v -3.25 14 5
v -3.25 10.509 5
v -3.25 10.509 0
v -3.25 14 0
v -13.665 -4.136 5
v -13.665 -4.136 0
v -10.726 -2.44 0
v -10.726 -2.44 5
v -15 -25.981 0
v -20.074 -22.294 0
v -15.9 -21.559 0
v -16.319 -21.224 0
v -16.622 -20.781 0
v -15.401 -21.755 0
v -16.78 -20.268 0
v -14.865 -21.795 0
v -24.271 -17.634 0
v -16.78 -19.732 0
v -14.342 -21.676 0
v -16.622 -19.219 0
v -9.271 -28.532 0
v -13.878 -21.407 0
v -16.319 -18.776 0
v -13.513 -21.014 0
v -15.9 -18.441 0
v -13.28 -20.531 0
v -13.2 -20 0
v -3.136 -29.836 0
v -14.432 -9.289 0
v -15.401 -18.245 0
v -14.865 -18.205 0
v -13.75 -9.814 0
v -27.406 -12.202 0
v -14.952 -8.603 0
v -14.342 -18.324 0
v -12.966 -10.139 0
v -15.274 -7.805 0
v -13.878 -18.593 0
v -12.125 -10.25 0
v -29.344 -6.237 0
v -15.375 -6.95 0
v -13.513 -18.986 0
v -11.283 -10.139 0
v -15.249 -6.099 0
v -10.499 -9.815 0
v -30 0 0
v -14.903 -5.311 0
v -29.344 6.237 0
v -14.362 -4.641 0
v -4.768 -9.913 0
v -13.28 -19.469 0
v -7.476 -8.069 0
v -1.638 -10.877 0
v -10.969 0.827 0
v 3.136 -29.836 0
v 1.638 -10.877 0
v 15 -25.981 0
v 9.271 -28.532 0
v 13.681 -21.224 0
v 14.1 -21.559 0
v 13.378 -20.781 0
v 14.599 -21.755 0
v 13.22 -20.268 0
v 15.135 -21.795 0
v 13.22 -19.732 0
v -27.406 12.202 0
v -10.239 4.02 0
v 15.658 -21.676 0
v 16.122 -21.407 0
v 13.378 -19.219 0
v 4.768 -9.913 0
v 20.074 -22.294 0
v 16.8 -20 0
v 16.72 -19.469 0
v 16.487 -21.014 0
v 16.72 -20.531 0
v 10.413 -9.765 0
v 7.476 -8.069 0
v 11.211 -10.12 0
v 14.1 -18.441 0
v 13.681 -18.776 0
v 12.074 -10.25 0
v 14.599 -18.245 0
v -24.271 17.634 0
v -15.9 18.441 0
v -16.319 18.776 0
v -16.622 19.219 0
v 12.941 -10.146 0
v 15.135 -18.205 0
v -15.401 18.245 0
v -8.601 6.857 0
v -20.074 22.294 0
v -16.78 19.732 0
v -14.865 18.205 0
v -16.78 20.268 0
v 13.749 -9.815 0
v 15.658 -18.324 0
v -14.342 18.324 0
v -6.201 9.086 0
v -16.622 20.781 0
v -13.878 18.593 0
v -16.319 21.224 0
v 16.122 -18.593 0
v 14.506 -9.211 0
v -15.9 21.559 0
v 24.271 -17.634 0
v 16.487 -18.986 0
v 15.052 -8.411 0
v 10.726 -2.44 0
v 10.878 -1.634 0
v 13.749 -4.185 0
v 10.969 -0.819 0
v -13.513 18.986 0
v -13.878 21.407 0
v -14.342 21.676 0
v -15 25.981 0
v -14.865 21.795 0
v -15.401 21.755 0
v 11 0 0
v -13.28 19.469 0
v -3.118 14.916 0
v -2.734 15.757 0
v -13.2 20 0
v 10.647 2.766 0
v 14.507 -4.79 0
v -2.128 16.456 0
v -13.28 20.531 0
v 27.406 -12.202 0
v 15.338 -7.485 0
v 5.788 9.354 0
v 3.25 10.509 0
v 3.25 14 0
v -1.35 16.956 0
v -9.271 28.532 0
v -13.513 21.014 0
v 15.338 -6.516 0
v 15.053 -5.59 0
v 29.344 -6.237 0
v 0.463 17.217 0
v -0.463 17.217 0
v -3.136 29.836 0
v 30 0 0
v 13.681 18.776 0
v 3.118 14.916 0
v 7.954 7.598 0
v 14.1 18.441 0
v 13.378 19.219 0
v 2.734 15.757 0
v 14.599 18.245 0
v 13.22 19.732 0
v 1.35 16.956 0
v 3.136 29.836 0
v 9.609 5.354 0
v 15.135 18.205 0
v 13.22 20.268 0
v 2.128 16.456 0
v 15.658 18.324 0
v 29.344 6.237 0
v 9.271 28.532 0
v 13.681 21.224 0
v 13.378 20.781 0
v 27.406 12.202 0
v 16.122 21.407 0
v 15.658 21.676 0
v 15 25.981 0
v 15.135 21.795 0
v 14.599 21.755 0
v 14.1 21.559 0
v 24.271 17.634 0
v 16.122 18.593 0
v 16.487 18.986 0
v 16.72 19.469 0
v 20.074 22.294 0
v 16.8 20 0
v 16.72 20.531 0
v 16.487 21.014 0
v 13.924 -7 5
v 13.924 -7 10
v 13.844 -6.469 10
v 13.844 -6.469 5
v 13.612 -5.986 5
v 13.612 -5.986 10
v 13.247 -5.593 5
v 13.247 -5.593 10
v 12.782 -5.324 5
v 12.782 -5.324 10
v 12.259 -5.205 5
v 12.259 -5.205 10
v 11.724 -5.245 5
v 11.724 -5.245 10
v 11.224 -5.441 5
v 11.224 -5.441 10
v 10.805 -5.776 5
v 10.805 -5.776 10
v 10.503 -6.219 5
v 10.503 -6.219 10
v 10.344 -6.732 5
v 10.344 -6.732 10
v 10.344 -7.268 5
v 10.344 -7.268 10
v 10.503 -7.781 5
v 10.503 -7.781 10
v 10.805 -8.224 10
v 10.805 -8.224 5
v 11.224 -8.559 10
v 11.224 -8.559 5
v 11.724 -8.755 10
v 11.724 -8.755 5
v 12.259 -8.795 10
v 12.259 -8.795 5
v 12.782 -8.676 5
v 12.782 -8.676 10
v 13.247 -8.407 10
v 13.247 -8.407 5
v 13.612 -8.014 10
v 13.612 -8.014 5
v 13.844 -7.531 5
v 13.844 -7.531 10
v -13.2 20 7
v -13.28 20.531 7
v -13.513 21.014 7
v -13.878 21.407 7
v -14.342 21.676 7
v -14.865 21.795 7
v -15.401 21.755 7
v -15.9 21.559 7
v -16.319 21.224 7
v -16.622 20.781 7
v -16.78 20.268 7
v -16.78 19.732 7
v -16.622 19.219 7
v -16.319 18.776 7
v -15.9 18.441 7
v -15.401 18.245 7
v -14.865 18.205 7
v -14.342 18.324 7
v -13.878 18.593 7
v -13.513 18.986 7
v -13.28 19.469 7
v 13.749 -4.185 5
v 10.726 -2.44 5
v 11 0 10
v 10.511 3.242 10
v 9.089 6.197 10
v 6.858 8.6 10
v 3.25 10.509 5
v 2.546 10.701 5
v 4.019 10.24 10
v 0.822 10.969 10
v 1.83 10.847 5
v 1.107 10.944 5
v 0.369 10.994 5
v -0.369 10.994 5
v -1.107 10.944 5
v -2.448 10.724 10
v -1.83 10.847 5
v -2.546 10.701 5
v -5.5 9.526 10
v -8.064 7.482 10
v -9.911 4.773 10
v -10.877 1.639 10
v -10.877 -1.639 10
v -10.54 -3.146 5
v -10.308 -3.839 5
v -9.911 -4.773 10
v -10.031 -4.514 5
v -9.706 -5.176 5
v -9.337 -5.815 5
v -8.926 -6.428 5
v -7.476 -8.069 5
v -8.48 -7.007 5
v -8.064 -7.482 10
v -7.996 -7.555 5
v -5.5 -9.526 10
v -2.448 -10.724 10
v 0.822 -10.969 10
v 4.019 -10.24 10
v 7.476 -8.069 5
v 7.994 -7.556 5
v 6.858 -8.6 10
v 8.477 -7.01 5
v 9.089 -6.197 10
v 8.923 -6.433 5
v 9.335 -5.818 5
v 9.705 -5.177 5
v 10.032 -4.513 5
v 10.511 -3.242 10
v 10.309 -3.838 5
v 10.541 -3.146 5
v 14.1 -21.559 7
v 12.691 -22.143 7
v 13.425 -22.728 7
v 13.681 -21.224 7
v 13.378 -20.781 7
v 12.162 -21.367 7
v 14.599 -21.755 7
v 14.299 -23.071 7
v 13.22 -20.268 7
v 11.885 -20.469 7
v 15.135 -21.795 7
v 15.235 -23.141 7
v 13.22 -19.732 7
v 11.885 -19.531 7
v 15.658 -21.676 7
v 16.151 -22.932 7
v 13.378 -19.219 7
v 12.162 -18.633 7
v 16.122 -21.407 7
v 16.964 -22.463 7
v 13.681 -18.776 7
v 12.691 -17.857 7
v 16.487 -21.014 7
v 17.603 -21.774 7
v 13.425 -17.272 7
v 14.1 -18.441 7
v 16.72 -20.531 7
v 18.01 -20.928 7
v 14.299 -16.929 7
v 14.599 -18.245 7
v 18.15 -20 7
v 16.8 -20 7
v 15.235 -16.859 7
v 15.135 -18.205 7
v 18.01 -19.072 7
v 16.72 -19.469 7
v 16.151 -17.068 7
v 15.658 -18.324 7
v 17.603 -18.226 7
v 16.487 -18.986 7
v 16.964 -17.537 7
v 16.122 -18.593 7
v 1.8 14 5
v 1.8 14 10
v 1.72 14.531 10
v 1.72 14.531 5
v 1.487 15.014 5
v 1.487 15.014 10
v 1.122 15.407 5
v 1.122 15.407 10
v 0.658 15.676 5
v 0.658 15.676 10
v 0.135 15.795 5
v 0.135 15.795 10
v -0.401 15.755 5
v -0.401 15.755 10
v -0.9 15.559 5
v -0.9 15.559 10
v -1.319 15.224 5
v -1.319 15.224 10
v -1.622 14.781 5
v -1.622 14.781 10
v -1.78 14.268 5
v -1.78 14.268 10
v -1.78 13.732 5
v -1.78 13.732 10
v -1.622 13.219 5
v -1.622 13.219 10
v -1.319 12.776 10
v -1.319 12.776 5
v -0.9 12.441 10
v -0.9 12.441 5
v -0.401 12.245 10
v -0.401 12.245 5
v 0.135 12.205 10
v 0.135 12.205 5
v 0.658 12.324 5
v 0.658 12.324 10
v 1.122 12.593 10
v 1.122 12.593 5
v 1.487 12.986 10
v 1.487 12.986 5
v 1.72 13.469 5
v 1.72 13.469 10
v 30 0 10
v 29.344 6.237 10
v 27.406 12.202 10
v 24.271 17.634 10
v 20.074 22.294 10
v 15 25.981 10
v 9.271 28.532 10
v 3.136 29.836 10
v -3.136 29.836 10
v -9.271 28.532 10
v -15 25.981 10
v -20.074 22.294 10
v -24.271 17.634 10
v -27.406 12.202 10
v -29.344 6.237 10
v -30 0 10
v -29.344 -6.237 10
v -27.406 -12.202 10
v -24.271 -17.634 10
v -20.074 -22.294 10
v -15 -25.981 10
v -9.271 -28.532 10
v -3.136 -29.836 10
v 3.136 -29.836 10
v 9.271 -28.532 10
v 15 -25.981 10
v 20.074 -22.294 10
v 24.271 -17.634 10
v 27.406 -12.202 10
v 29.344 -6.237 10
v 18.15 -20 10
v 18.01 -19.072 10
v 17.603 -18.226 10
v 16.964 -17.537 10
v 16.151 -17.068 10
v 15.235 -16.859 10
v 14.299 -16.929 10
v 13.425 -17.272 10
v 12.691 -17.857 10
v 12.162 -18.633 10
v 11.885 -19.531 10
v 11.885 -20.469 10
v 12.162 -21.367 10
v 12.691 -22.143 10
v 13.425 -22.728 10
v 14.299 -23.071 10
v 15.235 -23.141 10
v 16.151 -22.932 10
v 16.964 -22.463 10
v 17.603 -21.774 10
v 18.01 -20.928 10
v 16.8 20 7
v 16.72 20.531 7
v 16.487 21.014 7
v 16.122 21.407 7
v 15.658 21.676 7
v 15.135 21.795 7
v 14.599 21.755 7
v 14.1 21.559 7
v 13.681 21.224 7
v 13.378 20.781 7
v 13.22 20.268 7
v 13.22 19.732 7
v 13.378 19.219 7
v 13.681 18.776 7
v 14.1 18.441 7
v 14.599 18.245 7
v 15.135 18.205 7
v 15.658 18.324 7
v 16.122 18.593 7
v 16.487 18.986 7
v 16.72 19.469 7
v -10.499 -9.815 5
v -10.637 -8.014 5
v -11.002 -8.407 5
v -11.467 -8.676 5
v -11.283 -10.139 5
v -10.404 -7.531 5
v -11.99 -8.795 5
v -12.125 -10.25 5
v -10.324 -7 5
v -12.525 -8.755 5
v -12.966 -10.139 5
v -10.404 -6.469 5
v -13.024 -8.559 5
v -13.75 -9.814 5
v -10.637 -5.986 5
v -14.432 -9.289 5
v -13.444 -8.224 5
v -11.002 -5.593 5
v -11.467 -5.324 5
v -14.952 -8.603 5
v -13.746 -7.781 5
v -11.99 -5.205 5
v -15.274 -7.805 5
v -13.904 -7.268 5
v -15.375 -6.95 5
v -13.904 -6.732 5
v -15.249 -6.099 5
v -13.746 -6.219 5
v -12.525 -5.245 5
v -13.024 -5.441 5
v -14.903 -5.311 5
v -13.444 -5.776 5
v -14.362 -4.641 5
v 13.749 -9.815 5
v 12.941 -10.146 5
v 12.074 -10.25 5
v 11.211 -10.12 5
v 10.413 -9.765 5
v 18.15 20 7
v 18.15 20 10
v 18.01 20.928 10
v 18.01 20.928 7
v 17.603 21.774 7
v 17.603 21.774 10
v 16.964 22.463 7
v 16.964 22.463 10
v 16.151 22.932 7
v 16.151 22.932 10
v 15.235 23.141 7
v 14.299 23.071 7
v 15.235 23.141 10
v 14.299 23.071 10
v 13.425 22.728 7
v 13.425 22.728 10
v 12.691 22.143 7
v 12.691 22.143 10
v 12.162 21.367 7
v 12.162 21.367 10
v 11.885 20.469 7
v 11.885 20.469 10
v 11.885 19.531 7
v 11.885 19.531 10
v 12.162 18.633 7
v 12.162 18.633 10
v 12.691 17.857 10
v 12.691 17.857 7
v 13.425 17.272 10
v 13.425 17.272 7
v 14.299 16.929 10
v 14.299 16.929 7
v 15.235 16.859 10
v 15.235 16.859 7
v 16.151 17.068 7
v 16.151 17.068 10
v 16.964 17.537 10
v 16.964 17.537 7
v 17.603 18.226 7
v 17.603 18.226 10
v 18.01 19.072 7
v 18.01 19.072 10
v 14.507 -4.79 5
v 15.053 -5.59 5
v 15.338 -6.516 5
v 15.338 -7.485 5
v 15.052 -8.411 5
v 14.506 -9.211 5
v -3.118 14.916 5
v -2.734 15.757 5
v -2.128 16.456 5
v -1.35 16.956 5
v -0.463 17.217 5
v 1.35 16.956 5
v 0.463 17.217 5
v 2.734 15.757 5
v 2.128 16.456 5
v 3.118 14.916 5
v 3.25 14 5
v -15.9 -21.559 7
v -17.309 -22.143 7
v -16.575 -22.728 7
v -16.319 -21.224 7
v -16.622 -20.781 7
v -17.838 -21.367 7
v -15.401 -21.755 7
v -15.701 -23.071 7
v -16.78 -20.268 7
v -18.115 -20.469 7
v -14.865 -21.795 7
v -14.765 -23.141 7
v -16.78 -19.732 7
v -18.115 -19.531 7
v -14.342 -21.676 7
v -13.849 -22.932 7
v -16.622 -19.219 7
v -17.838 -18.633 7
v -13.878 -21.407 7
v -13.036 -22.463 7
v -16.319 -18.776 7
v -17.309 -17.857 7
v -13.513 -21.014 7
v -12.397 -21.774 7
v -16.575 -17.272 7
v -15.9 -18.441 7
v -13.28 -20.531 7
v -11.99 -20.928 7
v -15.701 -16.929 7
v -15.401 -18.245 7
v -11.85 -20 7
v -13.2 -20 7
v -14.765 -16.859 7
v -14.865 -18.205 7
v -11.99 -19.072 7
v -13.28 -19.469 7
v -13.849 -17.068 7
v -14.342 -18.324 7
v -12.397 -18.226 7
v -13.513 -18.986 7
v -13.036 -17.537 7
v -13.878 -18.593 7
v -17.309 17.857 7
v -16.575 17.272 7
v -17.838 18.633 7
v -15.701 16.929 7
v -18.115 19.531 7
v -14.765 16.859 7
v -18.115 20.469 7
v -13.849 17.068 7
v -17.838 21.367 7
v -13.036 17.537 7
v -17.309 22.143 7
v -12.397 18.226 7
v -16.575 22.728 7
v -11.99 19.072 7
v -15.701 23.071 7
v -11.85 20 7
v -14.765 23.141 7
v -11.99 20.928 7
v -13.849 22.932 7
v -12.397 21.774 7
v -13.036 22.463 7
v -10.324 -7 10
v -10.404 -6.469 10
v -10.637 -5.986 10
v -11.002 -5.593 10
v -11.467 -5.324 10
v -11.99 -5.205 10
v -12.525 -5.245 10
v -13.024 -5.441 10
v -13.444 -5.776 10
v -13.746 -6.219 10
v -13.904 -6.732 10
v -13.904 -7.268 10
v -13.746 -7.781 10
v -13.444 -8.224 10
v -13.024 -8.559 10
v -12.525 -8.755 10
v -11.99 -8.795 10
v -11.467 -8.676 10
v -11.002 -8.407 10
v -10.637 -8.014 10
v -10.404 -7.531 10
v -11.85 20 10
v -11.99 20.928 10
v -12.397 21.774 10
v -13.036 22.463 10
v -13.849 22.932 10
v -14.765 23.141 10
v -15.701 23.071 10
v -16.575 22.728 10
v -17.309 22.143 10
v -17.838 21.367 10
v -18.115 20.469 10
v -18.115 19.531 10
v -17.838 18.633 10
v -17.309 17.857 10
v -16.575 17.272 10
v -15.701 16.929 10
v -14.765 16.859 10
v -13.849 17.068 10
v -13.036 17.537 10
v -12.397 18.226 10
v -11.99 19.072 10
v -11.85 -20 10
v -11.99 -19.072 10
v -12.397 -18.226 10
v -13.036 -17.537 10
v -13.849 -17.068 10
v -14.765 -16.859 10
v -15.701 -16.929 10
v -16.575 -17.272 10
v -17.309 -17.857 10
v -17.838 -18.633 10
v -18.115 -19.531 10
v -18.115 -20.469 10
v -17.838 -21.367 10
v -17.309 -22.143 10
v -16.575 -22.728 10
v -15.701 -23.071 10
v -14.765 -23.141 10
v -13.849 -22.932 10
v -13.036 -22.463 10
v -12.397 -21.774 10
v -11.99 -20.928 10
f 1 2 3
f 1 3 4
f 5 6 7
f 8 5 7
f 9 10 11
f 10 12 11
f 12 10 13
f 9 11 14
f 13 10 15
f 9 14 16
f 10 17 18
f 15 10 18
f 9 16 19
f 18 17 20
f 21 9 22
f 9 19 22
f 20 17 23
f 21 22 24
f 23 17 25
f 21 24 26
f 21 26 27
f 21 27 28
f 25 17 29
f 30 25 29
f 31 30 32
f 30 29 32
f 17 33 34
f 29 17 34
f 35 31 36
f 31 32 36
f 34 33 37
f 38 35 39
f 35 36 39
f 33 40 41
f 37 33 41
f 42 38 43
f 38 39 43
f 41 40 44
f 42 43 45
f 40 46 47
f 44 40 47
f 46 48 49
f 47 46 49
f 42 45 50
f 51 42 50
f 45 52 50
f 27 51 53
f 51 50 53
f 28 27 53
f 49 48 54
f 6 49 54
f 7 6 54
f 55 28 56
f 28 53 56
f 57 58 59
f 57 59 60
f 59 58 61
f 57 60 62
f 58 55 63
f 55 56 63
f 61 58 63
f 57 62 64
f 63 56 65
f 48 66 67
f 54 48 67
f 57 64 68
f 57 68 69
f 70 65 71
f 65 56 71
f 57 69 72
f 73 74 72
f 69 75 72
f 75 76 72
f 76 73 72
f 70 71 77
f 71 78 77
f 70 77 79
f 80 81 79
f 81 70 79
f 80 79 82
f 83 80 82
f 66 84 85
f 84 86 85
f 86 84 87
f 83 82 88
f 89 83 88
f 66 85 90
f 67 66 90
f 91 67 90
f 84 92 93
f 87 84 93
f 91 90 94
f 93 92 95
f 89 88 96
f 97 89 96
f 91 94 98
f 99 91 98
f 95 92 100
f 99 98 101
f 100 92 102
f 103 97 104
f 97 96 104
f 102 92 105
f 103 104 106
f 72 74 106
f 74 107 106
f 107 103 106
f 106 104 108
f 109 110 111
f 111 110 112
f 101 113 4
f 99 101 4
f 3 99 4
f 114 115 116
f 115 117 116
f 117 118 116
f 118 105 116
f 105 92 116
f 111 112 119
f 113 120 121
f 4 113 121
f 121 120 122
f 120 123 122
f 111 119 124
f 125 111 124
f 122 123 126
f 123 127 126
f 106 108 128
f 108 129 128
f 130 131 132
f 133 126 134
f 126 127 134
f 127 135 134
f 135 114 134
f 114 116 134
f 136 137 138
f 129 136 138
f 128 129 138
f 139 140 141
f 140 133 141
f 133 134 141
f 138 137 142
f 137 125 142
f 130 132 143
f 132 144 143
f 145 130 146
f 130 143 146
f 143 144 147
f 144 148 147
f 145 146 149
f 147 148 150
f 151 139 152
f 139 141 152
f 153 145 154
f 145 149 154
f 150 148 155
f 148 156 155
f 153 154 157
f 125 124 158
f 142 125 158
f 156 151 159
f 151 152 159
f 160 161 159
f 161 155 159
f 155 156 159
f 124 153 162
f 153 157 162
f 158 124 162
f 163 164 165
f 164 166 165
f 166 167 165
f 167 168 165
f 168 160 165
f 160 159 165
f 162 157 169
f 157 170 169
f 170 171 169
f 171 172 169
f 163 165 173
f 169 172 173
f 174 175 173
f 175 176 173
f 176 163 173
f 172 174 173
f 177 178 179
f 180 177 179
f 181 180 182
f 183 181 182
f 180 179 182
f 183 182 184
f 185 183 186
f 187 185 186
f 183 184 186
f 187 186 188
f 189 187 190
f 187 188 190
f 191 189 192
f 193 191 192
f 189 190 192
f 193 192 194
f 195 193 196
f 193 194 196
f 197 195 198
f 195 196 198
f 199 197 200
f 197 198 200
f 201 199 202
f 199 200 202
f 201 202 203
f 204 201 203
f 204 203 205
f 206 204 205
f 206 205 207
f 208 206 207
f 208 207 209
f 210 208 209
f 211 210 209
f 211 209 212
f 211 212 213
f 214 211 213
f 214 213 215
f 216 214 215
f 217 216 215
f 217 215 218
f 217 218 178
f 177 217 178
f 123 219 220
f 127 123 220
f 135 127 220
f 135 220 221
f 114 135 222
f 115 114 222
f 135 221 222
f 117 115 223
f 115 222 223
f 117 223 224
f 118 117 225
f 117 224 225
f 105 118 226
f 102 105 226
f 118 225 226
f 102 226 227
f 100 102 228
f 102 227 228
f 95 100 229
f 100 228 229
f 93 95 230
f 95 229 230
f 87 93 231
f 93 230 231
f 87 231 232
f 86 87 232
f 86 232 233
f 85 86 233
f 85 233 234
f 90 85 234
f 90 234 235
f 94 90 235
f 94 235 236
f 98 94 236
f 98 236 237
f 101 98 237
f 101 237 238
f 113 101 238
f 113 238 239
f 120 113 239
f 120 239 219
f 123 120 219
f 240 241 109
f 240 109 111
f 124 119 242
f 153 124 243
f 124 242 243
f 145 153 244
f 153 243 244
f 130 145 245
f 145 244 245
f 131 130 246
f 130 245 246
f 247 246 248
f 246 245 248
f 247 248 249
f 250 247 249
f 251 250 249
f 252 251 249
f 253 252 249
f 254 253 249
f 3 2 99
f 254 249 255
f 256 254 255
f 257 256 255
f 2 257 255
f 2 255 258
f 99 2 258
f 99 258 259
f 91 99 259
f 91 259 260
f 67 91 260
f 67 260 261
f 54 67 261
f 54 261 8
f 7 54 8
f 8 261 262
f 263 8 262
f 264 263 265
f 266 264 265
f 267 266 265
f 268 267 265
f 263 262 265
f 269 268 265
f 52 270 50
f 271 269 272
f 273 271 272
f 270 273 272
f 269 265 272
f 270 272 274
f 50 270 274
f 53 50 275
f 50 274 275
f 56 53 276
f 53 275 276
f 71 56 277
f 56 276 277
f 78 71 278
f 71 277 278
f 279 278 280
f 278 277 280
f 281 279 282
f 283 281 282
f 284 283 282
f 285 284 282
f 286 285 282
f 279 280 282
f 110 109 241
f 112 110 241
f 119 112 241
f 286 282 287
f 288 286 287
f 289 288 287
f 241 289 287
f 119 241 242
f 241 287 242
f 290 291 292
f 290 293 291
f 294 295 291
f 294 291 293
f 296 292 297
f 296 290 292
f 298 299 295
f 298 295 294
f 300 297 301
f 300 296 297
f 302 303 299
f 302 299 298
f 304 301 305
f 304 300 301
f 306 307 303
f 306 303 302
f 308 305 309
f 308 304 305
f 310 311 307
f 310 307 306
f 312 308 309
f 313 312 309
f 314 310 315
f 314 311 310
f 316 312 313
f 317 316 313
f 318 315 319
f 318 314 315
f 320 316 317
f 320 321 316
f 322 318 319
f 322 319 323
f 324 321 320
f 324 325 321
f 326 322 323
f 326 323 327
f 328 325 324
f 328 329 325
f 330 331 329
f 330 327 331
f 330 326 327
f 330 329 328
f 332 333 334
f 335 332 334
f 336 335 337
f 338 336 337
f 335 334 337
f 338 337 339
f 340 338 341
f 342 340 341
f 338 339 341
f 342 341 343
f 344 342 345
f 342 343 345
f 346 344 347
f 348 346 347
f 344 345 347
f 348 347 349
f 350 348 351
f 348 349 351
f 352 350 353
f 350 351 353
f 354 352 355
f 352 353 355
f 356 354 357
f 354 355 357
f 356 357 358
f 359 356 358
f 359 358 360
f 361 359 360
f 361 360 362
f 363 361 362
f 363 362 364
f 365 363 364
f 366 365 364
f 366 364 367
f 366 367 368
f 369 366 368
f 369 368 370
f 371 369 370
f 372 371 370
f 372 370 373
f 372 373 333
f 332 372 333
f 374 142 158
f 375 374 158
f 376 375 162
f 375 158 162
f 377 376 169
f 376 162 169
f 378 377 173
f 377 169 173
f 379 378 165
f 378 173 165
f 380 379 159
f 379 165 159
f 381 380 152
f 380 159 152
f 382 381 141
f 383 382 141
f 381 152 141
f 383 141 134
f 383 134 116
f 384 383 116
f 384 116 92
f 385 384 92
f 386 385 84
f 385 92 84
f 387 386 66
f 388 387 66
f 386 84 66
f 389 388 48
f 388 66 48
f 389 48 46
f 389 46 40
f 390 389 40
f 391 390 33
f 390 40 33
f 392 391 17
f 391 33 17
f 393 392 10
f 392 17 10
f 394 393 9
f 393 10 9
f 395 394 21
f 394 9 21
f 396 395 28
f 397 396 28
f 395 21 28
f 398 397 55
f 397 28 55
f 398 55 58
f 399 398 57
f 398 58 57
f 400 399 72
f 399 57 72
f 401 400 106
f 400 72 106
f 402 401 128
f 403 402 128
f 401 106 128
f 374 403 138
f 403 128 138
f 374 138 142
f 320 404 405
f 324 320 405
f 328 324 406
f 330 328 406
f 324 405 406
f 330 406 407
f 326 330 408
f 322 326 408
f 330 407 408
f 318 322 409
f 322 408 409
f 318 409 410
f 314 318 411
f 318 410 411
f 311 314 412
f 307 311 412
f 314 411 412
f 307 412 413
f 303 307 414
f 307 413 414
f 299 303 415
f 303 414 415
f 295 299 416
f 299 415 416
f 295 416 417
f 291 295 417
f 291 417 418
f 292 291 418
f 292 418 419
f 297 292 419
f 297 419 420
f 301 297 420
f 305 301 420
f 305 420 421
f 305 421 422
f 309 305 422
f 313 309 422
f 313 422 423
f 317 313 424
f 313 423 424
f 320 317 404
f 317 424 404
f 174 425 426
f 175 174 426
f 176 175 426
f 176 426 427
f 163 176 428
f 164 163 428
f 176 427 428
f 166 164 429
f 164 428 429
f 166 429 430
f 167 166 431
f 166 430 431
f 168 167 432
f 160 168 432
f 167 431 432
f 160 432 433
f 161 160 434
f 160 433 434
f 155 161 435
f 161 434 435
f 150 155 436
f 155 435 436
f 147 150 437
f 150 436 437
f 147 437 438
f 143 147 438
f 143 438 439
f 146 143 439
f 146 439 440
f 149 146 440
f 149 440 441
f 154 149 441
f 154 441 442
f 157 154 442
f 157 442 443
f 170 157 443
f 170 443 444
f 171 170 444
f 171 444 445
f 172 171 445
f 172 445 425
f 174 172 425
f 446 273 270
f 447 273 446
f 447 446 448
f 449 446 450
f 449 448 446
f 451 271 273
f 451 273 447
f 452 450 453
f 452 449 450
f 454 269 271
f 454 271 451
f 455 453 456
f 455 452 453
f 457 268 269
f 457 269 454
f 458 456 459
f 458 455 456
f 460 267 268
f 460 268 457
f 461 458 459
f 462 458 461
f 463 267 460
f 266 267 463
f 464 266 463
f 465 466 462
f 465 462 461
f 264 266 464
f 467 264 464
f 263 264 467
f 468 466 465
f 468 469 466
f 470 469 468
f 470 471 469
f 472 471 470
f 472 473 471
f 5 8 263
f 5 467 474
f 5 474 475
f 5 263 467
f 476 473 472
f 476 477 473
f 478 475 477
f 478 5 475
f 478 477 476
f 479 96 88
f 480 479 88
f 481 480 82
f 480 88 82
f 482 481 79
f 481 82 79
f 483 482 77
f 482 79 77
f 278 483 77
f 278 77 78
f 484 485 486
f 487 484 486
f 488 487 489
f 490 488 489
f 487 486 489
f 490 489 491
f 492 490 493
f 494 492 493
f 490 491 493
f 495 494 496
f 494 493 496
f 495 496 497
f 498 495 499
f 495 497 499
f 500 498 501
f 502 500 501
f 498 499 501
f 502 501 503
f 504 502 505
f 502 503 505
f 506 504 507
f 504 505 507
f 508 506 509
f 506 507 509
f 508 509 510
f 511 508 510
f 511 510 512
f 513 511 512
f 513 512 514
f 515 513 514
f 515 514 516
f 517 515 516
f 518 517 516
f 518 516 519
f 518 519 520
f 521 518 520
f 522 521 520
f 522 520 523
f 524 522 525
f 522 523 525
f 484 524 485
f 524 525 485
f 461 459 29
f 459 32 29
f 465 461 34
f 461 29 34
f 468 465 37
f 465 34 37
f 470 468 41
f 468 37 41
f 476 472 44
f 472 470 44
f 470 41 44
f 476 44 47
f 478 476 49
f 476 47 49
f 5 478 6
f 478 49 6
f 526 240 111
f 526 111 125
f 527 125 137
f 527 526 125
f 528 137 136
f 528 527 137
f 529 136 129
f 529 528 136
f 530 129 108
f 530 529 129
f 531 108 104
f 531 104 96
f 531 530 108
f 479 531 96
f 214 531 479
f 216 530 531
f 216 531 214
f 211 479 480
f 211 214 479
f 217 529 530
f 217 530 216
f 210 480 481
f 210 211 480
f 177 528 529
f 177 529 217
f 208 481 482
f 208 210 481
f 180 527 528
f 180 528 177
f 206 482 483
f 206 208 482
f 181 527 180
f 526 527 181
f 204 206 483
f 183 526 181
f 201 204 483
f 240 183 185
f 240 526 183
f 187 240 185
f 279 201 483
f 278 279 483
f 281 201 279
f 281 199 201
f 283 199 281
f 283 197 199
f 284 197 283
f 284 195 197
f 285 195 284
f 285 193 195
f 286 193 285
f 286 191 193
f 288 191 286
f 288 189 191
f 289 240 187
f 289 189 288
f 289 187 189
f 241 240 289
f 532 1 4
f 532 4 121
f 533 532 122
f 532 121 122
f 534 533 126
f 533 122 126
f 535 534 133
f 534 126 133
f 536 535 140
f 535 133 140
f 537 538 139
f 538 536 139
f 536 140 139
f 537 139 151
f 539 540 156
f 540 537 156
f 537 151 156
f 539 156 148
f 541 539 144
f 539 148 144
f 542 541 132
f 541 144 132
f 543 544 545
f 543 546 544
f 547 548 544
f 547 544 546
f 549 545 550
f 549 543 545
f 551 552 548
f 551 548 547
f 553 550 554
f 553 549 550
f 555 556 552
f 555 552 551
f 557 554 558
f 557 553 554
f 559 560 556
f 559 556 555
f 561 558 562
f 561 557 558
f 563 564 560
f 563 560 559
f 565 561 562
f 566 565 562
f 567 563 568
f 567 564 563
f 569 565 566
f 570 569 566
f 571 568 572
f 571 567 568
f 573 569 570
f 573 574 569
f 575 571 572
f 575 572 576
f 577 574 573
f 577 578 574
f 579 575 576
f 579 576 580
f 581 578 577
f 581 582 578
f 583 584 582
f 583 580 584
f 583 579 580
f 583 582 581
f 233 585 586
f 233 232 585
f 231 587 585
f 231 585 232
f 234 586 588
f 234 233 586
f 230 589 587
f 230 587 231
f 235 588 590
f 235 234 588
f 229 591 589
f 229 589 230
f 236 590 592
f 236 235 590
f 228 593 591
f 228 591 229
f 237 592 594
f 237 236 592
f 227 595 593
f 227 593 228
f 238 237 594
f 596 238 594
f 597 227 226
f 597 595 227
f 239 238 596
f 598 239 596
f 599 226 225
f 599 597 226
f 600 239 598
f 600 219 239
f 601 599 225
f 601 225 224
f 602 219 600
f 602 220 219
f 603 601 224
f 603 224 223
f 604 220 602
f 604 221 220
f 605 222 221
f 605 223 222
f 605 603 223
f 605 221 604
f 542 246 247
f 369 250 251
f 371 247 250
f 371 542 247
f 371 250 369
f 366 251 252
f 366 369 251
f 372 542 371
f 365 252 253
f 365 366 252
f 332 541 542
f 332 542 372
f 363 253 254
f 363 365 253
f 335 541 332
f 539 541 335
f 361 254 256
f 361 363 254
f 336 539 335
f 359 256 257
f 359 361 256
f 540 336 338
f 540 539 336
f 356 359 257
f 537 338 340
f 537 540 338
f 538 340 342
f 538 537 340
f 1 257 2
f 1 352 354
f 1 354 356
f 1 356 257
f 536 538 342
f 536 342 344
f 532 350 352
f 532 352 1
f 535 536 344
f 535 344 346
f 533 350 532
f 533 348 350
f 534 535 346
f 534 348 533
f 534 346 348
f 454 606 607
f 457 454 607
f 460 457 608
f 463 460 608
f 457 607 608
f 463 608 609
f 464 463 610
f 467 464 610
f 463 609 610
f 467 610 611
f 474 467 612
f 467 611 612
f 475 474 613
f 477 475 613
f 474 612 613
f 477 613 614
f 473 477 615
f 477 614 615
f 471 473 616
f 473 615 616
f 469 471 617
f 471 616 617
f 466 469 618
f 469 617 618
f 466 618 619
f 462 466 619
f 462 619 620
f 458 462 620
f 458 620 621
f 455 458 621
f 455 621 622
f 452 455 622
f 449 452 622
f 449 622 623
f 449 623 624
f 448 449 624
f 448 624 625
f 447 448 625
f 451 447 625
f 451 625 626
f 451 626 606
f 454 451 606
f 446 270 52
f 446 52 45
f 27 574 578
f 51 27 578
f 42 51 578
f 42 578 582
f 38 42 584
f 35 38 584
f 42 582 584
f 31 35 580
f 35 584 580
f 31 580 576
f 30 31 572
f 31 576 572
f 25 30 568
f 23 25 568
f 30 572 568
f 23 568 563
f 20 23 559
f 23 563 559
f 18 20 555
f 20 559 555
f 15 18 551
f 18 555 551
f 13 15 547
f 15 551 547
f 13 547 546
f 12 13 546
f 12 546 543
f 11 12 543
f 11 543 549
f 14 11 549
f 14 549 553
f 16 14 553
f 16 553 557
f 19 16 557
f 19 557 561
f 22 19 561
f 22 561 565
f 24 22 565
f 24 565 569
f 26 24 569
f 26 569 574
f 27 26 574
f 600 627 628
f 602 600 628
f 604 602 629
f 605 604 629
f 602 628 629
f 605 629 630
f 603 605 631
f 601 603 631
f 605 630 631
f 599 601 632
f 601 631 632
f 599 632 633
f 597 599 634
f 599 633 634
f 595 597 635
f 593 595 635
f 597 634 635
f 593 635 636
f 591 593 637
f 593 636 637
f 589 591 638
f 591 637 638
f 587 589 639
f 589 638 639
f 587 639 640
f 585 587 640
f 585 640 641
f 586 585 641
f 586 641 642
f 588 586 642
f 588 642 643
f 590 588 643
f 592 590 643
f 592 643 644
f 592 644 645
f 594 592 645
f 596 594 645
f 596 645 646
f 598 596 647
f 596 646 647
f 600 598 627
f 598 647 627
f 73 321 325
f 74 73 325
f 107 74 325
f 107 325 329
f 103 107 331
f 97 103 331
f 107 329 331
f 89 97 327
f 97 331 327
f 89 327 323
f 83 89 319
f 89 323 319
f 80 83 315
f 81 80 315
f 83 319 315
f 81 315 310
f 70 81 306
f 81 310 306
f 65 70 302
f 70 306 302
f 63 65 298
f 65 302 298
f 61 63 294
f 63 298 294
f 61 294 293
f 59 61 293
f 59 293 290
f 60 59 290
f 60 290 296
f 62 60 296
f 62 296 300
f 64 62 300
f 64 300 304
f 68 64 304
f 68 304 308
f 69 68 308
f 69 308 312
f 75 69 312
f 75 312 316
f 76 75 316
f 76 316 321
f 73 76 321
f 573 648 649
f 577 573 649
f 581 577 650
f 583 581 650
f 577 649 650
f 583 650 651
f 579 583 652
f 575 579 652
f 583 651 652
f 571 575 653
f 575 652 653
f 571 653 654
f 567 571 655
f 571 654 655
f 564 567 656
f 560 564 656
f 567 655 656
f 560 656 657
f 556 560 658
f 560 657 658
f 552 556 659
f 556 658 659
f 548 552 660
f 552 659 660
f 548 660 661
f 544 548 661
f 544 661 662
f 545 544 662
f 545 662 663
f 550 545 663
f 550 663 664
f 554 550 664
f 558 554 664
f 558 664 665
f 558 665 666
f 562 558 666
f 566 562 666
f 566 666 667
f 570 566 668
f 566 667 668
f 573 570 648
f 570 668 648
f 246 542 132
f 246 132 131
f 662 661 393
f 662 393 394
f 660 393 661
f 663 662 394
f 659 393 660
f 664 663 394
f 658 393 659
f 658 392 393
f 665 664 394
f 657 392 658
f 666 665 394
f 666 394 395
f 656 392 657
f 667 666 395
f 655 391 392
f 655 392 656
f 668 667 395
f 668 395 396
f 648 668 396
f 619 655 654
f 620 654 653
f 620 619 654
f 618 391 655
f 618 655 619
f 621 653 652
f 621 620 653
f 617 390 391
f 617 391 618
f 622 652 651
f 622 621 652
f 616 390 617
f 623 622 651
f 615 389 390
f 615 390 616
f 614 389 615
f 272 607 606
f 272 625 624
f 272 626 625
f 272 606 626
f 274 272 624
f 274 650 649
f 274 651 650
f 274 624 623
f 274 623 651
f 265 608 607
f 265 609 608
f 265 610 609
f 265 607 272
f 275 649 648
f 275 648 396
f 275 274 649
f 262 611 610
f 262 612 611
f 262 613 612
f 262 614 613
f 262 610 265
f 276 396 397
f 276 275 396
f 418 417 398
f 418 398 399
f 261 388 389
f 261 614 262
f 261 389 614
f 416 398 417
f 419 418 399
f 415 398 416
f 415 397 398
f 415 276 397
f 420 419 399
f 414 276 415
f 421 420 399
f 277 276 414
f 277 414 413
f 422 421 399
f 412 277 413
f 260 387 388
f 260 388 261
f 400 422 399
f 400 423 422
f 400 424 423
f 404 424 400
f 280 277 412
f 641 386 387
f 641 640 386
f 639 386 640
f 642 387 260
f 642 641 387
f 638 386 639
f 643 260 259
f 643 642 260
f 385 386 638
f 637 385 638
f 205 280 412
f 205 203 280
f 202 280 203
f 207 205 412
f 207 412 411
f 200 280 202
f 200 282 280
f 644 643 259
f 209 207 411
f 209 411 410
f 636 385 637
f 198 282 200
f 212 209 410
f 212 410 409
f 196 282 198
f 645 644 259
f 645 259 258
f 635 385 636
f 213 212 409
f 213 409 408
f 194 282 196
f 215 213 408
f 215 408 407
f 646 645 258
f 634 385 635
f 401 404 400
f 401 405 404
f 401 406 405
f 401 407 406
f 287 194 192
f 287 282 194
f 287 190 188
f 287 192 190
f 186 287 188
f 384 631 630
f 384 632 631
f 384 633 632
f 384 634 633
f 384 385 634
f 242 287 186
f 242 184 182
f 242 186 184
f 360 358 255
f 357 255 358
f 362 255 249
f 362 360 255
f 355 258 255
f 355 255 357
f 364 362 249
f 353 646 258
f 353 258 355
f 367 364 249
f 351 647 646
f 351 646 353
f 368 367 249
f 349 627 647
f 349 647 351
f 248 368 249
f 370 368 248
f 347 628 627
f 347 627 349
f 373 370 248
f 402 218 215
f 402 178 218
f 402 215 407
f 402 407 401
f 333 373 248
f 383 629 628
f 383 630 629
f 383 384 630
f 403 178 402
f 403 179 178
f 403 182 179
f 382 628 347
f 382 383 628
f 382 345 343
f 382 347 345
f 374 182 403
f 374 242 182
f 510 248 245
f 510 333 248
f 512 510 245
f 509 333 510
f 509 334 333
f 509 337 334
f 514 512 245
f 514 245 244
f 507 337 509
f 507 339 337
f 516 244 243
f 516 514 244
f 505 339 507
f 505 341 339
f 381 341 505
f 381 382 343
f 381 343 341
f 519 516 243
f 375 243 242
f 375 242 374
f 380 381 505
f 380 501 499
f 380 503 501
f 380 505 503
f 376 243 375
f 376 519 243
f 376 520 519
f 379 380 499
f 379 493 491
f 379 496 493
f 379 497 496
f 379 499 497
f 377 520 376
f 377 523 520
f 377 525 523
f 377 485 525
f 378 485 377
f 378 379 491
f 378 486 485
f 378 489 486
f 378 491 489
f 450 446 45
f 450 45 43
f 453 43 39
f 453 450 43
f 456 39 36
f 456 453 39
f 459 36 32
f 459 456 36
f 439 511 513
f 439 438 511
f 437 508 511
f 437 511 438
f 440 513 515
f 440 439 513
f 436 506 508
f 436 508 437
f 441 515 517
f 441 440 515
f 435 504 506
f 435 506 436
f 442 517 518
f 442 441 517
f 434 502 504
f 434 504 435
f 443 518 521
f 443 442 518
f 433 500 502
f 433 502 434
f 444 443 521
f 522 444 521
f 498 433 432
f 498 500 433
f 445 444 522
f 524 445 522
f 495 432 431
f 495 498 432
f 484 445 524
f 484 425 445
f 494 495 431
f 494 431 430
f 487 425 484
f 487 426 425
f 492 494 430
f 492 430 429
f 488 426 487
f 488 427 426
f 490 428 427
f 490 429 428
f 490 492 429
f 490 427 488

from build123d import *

# Parameters (mm, degrees)
SKETCH_1_R          = 30
EXTRUDE_1_DEPTH     = 10
CUT_EXTRUDE_1_REACH = 45.589
SKETCH_2_R          = 1.8
SKETCH_3_R          = 3.25
CUT_EXTRUDE_2_DEPTH = 5
CUT_EXTRUDE_3_REACH = 45.589
SKETCH_4_R          = 1.8
SKETCH_5_R          = 3.15
CUT_EXTRUDE_4_DEPTH = 3
CUT_EXTRUDE_5_REACH = 45.589
SKETCH_6_R          = 11
CUT_EXTRUDE_START   = -5
CUT_EXTRUDE_6_DEPTH = 5


# Read off the part's stored shape, not the designer's step: 切除-拉伸6
with BuildPart() as part:
    # 草图1 → 凸台-拉伸1 (new body)
    with BuildSketch(Plane.XY):
        Circle(SKETCH_1_R)
    extrude(amount=EXTRUDE_1_DEPTH)

    # 草图2 → 切除-拉伸1 (cut, up to next)
    with BuildSketch(Plane.XY.offset(10), mode=Mode.PRIVATE) as cut_extrude_1_sk1:
        with Locations((0, 14)):
            Circle(SKETCH_2_R)
    cut_extrude_1_tool1 = extrude(cut_extrude_1_sk1.sketch, amount=-CUT_EXTRUDE_1_REACH, mode=Mode.PRIVATE) & part.part
    # 草图2 → 切除-拉伸1 (cut, up to next)
    with BuildSketch(Plane.XY.offset(10), mode=Mode.PRIVATE) as cut_extrude_1_sk2:
        with Locations((12.124355653, -7)):
            Circle(SKETCH_2_R)
    cut_extrude_1_tool2 = extrude(cut_extrude_1_sk2.sketch, amount=-CUT_EXTRUDE_1_REACH, mode=Mode.PRIVATE) & part.part
    # 草图2 → 切除-拉伸1 (cut, up to next)
    with BuildSketch(Plane.XY.offset(10), mode=Mode.PRIVATE) as cut_extrude_1_sk3:
        with Locations((-12.124355653, -7)):
            Circle(SKETCH_2_R)
    cut_extrude_1_tool3 = extrude(cut_extrude_1_sk3.sketch, amount=-CUT_EXTRUDE_1_REACH, mode=Mode.PRIVATE) & part.part
    add(cut_extrude_1_tool1.solids().sort_by_distance((0, 14, 10))[0], mode=Mode.SUBTRACT)
    add(cut_extrude_1_tool2.solids().sort_by_distance((12.124356, -7, 10))[0], mode=Mode.SUBTRACT)
    add(cut_extrude_1_tool3.solids().sort_by_distance((-12.124356, -7, 10))[0], mode=Mode.SUBTRACT)

    # 草图3 → 切除-拉伸2 (cut)
    with BuildSketch(Plane(origin=(0, 0, 0), x_dir=(-1, 0, 0), z_dir=(0, 0, -1))):
        with Locations((0, 14)):
            Circle(SKETCH_3_R)
        with Locations((12.125855653, -6.999133975)):
            Circle(SKETCH_3_R)
        with Locations((-12.122855653, -7.000866025)):
            Circle(SKETCH_3_R)
    extrude(amount=-CUT_EXTRUDE_2_DEPTH, mode=Mode.SUBTRACT)

    # 草图4 → 切除-拉伸3 (cut, up to next)
    with BuildSketch(Plane.XY.offset(10), mode=Mode.PRIVATE) as cut_extrude_3_sk1:
        with Locations((-15, -20)):
            Circle(SKETCH_4_R)
    cut_extrude_3_tool1 = extrude(cut_extrude_3_sk1.sketch, amount=-CUT_EXTRUDE_3_REACH, mode=Mode.PRIVATE) & part.part
    # 草图4 → 切除-拉伸3 (cut, up to next)
    with BuildSketch(Plane.XY.offset(10), mode=Mode.PRIVATE) as cut_extrude_3_sk2:
        with Locations((15, -20)):
            Circle(SKETCH_4_R)
    cut_extrude_3_tool2 = extrude(cut_extrude_3_sk2.sketch, amount=-CUT_EXTRUDE_3_REACH, mode=Mode.PRIVATE) & part.part
    # 草图4 → 切除-拉伸3 (cut, up to next)
    with BuildSketch(Plane.XY.offset(10), mode=Mode.PRIVATE) as cut_extrude_3_sk3:
        with Locations((15, 20)):
            Circle(SKETCH_4_R)
    cut_extrude_3_tool3 = extrude(cut_extrude_3_sk3.sketch, amount=-CUT_EXTRUDE_3_REACH, mode=Mode.PRIVATE) & part.part
    # 草图4 → 切除-拉伸3 (cut, up to next)
    with BuildSketch(Plane.XY.offset(10), mode=Mode.PRIVATE) as cut_extrude_3_sk4:
        with Locations((-15, 20)):
            Circle(SKETCH_4_R)
    cut_extrude_3_tool4 = extrude(cut_extrude_3_sk4.sketch, amount=-CUT_EXTRUDE_3_REACH, mode=Mode.PRIVATE) & part.part
    add(cut_extrude_3_tool1.solids().sort_by_distance((-15, -20, 10))[0], mode=Mode.SUBTRACT)
    add(cut_extrude_3_tool2.solids().sort_by_distance((15, -20, 10))[0], mode=Mode.SUBTRACT)
    add(cut_extrude_3_tool3.solids().sort_by_distance((15, 20, 10))[0], mode=Mode.SUBTRACT)
    add(cut_extrude_3_tool4.solids().sort_by_distance((-15, 20, 10))[0], mode=Mode.SUBTRACT)

    # 草图5 → 切除-拉伸4 (cut)
    with BuildSketch(Plane.XY.offset(10)):
        with Locations((-15, 20)):
            Circle(SKETCH_5_R)
        with Locations((15, 20)):
            Circle(SKETCH_5_R)
        with Locations((15, -20)):
            Circle(SKETCH_5_R)
        with Locations((-15, -20)):
            Circle(SKETCH_5_R)
    extrude(amount=-CUT_EXTRUDE_4_DEPTH, mode=Mode.SUBTRACT)

    # 草图6 → 切除-拉伸5 (cut, up to next)
    with BuildSketch(Plane.XY.offset(10), mode=Mode.PRIVATE) as cut_extrude_5_sk1:
        Circle(SKETCH_6_R)
    cut_extrude_5_tool1 = extrude(cut_extrude_5_sk1.sketch, amount=-CUT_EXTRUDE_5_REACH, mode=Mode.PRIVATE) & part.part
    add(cut_extrude_5_tool1.solids().sort_by_distance((0, 0, 10))[0], mode=Mode.SUBTRACT)

    # 切除-拉伸6 outline → 切除-拉伸6 (cut)
    with BuildSketch(Plane(origin=(0, 0, 0), x_dir=(-1, 0, 0), z_dir=(0, 0, -1)).offset(CUT_EXTRUDE_START)):
        with BuildLine():
            Line((-10.725995825, -2.439879827), (-13.749355653, -4.185417438))
            ThreePointArc((-13.749355653, -4.185417438), (-15.374355624, -7.000433013), (-13.748605595, -9.815015475))
            ThreePointArc((-13.748605595, -9.815015475), (-14.784005692, -5.135181039), (-10.031538938, -4.513117164))
            ThreePointArc((-10.031538938, -4.513117164), (-10.430407021, -3.493795841), (-10.725995825, -2.439879827))
        make_face()
        with BuildLine():
            Line((-3.25, 14), (-3.25, 10.508924778))
            ThreePointArc((-3.25, 10.508924778), (-2.189145313, 10.779964879), (-1.10660044, 10.944196429))
            ThreePointArc((-1.10660044, 10.944196429), (-2.660728418, 12.133713772), (-3.25, 14))
        make_face()
        with BuildLine():
            ThreePointArc((-8.92286522, -6.432921286), (-9.15608578, -8.327808571), (-10.413102364, -9.764784202))
            Line((-10.413102364, -9.764784202), (-7.475995825, -8.069044952))
            ThreePointArc((-7.475995825, -8.069044952), (-8.240138715, -7.2869825), (-8.92286522, -6.432921286))
        make_face()
        with BuildLine():
            Line((3.25, 10.508924778), (3.25, 14))
            ThreePointArc((3.25, 14), (2.660728418, 12.133713772), (1.10660044, 10.944196429))
            ThreePointArc((1.10660044, 10.944196429), (2.189145313, 10.779964879), (3.25, 10.508924778))
        make_face()
        with BuildLine():
            ThreePointArc((8.926440063, -6.427959847), (8.242163905, -7.284691768), (7.475995825, -8.069044952))
            Line((7.475995825, -8.069044952), (10.499355653, -9.814582562))
            ThreePointArc((10.499355653, -9.814582562), (12.124788665, -10.249999971), (13.750105595, -9.81414945))
            ThreePointArc((13.750105595, -9.81414945), (10.258542955, -9.659142113), (8.926440063, -6.427959847))
        make_face()
        with BuildLine():
            ThreePointArc((10.725995825, -2.439879827), (10.430184526, -3.49446001), (10.030964095, -4.514394681))
            ThreePointArc((10.030964095, -4.514394681), (11.789659007, -3.766569697), (13.664602363, -4.136485104))
            Line((13.664602363, -4.136485104), (10.725995825, -2.439879827))
        make_face()
    extrude(amount=CUT_EXTRUDE_6_DEPTH, mode=Mode.SUBTRACT)


solid = part.part
